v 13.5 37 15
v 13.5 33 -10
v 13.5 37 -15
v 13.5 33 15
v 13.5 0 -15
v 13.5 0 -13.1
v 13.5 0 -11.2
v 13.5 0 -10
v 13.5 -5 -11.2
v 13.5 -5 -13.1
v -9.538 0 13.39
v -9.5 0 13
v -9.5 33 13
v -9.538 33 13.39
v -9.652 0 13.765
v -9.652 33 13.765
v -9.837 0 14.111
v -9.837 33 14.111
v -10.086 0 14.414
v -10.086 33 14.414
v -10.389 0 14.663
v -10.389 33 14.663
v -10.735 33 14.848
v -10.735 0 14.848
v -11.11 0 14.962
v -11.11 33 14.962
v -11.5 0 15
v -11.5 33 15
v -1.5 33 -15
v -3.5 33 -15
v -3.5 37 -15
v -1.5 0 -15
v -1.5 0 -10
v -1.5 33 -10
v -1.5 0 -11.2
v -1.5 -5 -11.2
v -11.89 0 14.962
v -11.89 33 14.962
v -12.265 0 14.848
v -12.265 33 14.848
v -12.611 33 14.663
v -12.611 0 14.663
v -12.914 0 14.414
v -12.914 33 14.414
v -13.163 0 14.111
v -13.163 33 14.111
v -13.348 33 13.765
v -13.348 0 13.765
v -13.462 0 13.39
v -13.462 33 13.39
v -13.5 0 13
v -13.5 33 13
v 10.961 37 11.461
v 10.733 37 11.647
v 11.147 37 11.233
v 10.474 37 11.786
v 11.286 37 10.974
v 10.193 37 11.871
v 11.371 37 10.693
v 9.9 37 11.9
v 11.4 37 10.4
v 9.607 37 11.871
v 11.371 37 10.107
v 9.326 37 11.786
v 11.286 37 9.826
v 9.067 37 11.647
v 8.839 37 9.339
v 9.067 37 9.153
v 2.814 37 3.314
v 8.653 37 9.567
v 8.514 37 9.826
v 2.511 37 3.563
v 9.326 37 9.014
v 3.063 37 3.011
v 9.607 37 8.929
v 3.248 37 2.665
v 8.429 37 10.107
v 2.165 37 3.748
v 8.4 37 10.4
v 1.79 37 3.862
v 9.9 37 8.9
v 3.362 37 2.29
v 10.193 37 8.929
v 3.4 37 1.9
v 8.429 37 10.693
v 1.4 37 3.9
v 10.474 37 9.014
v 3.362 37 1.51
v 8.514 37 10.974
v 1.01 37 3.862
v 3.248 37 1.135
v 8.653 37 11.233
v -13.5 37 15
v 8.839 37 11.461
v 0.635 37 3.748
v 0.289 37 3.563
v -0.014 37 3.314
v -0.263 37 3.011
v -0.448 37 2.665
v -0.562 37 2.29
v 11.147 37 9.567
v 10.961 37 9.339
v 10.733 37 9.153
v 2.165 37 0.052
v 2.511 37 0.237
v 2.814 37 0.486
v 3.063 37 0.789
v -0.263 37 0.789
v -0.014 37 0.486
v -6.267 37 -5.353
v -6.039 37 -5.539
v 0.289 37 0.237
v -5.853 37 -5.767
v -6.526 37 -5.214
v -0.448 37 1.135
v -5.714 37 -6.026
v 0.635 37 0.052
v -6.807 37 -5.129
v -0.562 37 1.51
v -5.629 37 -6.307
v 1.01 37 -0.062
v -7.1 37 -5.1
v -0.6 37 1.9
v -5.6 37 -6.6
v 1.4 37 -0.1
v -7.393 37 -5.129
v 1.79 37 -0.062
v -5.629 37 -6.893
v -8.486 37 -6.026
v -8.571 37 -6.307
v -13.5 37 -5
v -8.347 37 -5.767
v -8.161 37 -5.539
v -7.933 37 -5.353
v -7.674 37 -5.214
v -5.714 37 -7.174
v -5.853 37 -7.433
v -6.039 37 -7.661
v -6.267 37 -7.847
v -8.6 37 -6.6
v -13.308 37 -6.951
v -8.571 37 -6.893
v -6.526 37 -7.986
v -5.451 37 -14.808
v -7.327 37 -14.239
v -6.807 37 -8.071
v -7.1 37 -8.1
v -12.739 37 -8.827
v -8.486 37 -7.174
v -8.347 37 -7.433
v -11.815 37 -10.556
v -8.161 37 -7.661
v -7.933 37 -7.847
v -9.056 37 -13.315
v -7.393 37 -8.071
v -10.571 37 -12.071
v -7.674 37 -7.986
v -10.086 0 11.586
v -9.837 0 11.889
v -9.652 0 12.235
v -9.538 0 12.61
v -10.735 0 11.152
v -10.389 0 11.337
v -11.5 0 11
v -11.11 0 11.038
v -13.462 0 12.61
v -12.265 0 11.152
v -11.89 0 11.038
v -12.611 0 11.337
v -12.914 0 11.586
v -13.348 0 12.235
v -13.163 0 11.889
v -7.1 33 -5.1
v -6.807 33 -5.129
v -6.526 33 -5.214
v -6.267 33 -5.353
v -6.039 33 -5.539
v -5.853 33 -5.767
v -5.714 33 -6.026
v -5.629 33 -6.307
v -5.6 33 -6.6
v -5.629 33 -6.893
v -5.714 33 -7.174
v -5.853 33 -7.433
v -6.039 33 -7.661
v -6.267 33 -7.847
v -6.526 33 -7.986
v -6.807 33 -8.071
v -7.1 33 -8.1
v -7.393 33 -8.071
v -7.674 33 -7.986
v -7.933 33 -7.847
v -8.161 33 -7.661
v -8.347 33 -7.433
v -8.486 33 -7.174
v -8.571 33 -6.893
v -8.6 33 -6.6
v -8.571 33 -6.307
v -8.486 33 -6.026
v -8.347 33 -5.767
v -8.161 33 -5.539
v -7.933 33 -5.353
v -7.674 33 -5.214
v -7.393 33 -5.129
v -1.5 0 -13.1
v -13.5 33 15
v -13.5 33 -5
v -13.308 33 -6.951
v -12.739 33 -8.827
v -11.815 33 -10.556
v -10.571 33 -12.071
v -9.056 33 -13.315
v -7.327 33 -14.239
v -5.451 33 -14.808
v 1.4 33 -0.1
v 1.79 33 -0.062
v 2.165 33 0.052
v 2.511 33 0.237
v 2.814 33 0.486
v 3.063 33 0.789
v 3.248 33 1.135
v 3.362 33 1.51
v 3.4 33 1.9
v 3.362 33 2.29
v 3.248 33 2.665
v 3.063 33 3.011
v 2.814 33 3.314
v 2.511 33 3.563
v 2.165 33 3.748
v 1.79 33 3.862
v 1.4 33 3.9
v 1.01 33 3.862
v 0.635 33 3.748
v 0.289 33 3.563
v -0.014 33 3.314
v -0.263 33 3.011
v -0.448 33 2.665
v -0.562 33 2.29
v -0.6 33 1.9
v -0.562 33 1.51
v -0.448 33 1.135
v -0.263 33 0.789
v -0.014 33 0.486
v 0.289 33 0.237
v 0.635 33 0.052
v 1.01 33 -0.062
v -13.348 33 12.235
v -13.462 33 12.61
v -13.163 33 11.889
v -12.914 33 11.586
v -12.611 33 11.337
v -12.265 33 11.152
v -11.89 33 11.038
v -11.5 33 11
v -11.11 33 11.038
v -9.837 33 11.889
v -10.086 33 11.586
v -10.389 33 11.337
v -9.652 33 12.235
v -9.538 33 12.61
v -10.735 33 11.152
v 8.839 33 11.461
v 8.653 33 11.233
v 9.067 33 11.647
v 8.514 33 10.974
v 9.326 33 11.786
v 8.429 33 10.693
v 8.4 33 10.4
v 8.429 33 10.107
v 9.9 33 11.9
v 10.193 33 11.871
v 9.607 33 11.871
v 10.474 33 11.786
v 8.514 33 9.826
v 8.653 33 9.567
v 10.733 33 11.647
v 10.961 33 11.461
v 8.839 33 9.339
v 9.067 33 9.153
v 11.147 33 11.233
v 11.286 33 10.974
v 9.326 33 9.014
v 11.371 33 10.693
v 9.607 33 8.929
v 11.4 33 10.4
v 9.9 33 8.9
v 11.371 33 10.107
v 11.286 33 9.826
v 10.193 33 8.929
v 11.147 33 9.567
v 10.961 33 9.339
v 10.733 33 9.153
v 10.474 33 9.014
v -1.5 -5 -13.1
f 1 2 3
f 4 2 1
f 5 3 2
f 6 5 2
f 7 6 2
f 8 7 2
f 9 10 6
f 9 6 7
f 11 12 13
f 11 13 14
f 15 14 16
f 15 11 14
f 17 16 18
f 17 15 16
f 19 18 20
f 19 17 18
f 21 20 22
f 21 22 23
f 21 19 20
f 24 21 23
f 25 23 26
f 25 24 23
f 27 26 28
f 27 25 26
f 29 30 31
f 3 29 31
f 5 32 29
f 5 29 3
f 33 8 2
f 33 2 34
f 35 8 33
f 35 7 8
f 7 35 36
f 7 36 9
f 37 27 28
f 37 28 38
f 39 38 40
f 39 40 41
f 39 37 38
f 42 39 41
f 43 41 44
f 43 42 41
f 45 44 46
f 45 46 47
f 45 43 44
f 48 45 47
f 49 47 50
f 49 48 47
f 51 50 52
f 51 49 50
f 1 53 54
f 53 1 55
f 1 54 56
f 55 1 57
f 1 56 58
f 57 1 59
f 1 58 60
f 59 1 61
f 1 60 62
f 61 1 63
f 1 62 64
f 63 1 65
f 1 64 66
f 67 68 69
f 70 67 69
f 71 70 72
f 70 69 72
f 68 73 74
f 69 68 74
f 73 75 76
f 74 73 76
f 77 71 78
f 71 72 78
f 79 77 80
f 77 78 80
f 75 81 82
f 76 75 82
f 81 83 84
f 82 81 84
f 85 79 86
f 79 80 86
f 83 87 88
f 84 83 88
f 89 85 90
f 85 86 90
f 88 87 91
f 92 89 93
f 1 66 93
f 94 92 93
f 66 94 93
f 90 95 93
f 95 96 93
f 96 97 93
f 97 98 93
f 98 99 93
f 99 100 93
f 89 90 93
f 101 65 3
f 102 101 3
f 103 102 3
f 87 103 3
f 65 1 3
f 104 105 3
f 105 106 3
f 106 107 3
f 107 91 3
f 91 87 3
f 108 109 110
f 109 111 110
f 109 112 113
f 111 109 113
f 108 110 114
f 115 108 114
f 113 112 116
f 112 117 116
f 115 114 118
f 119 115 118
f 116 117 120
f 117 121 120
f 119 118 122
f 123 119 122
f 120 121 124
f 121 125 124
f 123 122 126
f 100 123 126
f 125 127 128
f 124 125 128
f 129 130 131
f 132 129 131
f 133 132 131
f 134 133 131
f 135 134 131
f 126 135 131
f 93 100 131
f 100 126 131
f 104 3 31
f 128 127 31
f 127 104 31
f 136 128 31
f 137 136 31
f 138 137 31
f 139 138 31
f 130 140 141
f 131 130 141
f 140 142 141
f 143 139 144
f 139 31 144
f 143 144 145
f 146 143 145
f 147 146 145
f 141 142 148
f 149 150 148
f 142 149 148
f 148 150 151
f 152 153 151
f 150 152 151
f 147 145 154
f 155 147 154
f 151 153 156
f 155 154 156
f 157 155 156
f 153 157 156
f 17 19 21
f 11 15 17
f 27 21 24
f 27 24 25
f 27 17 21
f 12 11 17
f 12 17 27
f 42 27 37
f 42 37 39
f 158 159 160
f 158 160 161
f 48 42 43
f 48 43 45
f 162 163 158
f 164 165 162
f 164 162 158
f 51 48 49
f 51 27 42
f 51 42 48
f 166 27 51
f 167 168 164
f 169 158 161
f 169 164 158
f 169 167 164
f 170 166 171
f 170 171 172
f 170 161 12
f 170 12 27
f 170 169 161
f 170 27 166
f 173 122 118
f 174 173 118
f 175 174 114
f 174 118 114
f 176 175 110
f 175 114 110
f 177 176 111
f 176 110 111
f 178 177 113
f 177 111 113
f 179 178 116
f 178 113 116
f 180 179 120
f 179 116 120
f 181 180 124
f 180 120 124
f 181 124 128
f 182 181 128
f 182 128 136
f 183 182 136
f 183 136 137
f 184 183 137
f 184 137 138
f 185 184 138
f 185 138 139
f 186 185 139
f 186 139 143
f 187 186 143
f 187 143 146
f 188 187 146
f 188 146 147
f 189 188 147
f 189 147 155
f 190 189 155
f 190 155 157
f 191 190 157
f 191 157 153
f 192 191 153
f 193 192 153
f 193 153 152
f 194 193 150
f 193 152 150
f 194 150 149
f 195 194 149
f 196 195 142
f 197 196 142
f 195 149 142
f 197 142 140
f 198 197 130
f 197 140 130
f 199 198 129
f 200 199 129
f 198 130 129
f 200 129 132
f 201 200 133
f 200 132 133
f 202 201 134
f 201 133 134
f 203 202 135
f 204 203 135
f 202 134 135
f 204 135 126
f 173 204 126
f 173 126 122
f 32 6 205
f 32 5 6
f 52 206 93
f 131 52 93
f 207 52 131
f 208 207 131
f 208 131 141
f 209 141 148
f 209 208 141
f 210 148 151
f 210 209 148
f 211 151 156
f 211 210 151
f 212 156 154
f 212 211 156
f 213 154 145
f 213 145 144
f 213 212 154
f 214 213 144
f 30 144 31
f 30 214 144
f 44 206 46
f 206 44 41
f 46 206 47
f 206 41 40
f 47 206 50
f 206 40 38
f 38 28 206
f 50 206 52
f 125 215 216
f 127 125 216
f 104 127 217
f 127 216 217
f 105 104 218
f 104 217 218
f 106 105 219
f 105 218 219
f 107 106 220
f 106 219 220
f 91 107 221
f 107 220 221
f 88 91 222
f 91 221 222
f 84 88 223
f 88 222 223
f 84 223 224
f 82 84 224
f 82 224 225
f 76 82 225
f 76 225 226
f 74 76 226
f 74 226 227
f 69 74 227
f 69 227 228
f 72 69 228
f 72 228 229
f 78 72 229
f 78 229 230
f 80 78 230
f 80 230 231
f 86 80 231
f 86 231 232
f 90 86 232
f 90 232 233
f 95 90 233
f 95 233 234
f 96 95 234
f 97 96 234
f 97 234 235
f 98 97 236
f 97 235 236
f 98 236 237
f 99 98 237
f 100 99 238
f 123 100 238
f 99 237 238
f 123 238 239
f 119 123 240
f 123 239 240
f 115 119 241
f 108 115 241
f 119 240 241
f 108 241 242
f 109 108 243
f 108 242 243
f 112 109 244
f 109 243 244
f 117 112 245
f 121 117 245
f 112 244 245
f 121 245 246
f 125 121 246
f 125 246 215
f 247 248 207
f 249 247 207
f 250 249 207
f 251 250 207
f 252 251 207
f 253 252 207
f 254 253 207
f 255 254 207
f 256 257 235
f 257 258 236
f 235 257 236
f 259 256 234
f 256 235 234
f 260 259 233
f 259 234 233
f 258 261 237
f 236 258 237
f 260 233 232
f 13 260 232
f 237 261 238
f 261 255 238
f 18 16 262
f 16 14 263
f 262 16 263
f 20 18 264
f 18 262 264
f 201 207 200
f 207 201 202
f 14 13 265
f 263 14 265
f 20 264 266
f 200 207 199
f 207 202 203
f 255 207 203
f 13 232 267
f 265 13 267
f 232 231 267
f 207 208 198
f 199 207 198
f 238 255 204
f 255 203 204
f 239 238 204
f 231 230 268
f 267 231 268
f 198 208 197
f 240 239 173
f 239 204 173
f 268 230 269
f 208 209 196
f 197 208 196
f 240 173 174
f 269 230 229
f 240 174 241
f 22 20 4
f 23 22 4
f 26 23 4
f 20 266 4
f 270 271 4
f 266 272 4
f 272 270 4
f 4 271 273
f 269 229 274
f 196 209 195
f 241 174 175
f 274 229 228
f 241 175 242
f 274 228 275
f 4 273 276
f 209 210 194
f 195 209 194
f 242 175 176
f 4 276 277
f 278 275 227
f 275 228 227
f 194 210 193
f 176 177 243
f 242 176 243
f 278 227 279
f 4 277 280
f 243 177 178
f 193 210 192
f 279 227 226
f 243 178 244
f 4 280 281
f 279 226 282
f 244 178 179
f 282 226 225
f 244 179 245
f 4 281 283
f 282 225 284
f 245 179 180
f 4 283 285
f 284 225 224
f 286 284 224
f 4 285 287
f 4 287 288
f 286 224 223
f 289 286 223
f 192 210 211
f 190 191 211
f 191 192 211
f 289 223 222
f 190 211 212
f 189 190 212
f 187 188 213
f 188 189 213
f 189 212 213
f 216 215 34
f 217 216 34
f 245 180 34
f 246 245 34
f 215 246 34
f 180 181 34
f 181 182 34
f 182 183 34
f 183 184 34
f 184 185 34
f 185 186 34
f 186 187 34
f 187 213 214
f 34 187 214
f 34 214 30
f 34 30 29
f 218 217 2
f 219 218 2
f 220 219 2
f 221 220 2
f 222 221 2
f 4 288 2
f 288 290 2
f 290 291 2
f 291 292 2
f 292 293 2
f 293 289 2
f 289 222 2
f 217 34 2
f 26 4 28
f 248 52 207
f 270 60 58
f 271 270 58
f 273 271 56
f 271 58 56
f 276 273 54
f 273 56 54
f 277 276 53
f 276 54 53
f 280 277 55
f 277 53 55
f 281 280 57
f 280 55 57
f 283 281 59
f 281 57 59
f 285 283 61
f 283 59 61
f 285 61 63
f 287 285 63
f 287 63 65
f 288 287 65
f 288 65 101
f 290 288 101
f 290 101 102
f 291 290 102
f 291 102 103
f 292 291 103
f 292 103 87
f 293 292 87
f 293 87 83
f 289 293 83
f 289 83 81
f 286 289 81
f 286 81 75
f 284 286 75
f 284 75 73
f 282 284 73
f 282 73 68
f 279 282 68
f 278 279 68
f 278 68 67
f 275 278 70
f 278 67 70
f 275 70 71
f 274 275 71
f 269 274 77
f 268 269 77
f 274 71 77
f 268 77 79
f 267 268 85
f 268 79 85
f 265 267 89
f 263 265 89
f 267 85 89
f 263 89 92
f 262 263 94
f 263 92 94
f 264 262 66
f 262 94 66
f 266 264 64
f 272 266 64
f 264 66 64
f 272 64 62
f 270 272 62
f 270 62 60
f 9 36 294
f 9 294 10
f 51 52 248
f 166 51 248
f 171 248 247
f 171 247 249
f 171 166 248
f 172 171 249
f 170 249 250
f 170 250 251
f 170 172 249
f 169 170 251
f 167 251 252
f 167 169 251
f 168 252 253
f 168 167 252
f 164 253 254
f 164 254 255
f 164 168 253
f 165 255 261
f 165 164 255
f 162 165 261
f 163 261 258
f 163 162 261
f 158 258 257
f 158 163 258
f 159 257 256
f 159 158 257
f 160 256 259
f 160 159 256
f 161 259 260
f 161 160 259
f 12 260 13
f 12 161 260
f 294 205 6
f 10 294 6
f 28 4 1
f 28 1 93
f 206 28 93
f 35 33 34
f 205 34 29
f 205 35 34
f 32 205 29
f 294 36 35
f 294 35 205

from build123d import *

# Parameters (mm, degrees)
EXTRUDE_1_DEPTH     = 37
CUT_EXTRUDE_1_DEPTH = 33
SKETCH_3_W          = 15
SKETCH_3_H          = 1.9
EXTRUDE_2_DEPTH     = 5
SKETCH_4_R          = 2
CUT_EXTRUDE_2_DEPTH = 10
SKETCH_5_R          = 1.5
CUT_EXTRUDE_3_DEPTH = 47.596673701


with BuildPart() as part:
    # 草图1 → 凸台-拉伸1 (new body)
    with BuildSketch(Plane(origin=(0, 0, 0), x_dir=(1, 0, 0), z_dir=(0, 1, 0))):
        with BuildLine():
            Line((-3.5, 15), (13.5, 15))
            Line((13.5, 15), (13.5, -15))
            Line((13.5, -15), (-13.5, -15))
            Line((-13.5, -15), (-13.5, 5))
            ThreePointArc((-13.5, 5), (-10.571067812, 12.071067812), (-3.5, 15))
        make_face()
    extrude(amount=EXTRUDE_1_DEPTH)

    # 草图2 → 切除-拉伸1 (cut)
    with BuildSketch(Plane(origin=(0, 0, 0), x_dir=(1, 0, 0), z_dir=(0, 1, 0))):
        with BuildLine():
            Line((-11.499999995, -15), (13.5, -15))
            Line((13.5, -15), (13.5, 10))
            Line((13.5, 10), (-1.5, 10))
            Line((-1.5, 10), (-1.5, 15))
            Line((-1.5, 15), (-13.5, 15))
            Line((-13.5, 15), (-13.5, -13))
            ThreePointArc((-13.5, -13), (-11.5, -11), (-9.5, -13))
            ThreePointArc((-9.5, -13), (-10.085786436, -14.414213561), (-11.499999995, -15))
        make_face()
        with BuildLine():
            Line((-13.5, -15), (-11.499999995, -15))
            ThreePointArc((-11.499999995, -15), (-12.914213561, -14.414213564), (-13.5, -13))
            Line((-13.5, -13), (-13.5, -15))
        make_face()
    extrude(amount=CUT_EXTRUDE_1_DEPTH, mode=Mode.SUBTRACT)

    # 草图3 → 凸台-拉伸2 (add)
    with BuildSketch(Plane.XZ):
        with Locations((6, -12.15)):
            Rectangle(SKETCH_3_W, SKETCH_3_H)
    extrude(amount=EXTRUDE_2_DEPTH)

    # 草图4 → 切除-拉伸2 (cut)
    with BuildSketch(Plane.XZ.offset(-33)):
        with Locations(Location((1.4, 1.9, 0), (0, 0, 270))):
            Circle(SKETCH_4_R)
    extrude(amount=-CUT_EXTRUDE_2_DEPTH, mode=Mode.SUBTRACT)

    # 草图5 → 切除-拉伸3 (cut, through all)
    with BuildSketch(Plane(origin=(0, 37, 0), x_dir=(1, 0, 0), z_dir=(0, 1, 0))):
        with Locations(Location((-7.1, 6.6, 0), (0, 0, 270))):
            Circle(SKETCH_5_R)
        with Locations(Location((9.9, -10.4, 0), (0, 0, 270))):
            Circle(SKETCH_5_R)
    extrude(amount=-CUT_EXTRUDE_3_DEPTH, mode=Mode.SUBTRACT)


solid = part.part
